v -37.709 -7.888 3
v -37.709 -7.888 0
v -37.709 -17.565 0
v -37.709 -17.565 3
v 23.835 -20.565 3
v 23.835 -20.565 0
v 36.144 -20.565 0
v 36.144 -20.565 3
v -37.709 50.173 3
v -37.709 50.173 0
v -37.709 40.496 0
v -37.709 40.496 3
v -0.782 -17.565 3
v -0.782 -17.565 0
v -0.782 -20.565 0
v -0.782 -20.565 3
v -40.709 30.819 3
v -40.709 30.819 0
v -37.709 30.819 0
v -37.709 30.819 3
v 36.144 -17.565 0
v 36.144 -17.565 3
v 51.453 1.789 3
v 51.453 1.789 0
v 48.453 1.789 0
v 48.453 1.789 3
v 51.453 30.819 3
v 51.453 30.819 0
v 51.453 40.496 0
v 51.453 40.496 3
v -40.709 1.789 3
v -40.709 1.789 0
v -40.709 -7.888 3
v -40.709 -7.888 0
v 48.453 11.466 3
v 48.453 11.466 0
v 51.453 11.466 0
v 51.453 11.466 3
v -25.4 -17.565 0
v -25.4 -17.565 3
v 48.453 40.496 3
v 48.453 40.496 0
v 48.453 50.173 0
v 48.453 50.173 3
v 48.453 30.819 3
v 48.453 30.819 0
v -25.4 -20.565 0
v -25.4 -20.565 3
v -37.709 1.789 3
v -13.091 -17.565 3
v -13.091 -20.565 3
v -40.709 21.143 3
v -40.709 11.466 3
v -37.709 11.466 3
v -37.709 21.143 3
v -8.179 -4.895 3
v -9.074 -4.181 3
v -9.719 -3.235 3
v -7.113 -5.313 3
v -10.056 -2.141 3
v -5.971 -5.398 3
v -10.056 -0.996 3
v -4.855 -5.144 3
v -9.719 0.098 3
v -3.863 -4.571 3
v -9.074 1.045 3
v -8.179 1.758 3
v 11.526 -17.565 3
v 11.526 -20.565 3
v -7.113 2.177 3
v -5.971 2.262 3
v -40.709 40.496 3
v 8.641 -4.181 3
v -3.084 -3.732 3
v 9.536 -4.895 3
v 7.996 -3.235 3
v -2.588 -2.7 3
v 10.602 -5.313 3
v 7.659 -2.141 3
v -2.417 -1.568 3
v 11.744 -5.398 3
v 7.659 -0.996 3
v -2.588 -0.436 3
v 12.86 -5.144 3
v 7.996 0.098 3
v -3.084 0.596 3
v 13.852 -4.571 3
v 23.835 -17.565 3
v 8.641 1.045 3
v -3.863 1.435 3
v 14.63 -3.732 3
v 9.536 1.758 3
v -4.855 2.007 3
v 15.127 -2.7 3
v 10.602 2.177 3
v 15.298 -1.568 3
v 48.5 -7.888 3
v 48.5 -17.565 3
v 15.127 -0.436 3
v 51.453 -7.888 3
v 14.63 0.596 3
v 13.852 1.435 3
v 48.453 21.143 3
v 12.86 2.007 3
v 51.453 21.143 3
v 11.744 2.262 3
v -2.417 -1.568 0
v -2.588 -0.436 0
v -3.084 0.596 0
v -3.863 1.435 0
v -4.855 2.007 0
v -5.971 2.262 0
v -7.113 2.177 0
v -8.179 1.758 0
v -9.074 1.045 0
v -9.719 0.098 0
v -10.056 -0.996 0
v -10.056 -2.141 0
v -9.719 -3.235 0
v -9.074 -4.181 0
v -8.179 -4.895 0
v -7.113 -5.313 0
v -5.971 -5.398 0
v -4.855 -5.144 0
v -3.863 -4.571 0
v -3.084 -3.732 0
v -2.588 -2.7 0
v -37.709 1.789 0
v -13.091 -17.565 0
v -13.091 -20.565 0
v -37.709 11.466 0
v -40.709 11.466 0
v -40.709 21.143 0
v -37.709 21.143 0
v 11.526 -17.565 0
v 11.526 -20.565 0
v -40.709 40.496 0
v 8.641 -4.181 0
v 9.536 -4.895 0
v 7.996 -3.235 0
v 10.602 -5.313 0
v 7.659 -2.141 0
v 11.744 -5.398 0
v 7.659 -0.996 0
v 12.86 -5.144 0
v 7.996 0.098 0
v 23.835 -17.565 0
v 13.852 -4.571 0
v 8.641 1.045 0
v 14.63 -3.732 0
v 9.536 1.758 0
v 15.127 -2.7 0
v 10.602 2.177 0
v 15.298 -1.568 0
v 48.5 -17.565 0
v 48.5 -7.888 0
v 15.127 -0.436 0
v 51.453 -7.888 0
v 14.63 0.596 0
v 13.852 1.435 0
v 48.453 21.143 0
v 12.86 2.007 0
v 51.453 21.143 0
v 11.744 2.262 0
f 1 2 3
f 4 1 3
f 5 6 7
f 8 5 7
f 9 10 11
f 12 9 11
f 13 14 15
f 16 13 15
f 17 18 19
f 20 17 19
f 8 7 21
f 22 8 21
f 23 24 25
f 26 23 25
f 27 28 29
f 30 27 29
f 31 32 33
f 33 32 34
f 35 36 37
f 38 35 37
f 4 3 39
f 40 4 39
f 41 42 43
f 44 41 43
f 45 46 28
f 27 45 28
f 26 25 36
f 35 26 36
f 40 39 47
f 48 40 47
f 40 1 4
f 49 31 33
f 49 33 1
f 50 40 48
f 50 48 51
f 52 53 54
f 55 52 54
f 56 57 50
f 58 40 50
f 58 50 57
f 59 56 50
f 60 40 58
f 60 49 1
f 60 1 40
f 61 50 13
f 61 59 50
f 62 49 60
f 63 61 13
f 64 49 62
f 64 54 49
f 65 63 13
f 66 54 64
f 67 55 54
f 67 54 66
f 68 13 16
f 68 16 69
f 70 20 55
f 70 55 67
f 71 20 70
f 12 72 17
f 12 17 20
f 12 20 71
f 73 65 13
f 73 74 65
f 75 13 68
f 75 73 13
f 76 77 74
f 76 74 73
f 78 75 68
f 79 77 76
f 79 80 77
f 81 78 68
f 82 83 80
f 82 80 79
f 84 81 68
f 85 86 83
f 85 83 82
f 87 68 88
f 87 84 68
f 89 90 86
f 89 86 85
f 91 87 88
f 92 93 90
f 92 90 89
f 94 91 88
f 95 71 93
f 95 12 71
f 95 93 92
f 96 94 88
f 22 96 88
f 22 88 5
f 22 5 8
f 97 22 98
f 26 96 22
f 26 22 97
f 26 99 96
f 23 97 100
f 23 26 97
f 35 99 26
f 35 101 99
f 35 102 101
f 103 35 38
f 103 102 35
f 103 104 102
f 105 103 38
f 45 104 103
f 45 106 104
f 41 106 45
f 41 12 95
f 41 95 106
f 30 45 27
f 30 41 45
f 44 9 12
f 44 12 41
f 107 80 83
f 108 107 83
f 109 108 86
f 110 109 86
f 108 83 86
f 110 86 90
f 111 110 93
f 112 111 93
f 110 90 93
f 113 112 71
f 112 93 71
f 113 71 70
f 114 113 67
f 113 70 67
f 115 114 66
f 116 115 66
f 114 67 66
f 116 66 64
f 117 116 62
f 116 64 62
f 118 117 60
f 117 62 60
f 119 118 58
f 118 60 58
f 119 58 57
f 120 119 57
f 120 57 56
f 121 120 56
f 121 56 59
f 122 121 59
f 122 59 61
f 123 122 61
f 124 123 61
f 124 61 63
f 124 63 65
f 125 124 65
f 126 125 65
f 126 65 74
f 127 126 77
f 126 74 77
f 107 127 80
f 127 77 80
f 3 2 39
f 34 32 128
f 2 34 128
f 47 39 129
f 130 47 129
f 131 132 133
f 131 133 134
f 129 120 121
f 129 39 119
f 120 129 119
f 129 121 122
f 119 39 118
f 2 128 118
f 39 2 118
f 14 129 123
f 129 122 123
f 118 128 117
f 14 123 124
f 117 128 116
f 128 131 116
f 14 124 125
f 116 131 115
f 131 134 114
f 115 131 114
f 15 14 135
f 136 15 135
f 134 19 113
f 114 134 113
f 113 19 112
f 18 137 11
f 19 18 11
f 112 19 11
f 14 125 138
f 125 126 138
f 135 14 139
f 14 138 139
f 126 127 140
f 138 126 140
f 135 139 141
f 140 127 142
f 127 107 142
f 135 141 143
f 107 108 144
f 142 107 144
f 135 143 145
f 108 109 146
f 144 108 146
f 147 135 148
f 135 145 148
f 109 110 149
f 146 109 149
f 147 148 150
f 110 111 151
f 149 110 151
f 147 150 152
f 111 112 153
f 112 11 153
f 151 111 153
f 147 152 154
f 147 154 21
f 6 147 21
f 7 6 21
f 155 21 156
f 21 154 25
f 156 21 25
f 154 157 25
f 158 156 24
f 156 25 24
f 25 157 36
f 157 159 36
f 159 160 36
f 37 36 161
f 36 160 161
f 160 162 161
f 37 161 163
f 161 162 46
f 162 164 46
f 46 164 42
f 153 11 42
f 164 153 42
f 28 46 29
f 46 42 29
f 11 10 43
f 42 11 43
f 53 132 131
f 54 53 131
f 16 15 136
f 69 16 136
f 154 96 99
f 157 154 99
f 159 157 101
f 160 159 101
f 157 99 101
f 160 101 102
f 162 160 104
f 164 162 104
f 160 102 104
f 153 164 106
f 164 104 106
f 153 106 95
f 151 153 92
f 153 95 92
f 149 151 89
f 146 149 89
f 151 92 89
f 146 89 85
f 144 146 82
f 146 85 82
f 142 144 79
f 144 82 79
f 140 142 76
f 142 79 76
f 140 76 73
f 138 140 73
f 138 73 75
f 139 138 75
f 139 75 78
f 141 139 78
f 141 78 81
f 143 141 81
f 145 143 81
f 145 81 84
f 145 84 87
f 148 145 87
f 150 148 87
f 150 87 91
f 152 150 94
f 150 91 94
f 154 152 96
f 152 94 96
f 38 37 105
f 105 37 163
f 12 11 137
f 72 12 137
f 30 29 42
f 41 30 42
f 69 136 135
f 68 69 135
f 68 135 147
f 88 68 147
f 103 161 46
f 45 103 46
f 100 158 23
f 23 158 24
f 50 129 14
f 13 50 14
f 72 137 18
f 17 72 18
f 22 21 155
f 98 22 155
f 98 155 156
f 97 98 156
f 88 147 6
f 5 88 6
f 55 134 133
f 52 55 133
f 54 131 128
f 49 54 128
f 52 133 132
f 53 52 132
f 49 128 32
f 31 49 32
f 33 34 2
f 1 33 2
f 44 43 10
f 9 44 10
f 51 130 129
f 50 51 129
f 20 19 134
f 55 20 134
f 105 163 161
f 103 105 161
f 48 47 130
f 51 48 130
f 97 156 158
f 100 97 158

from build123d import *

# Parameters (mm, degrees)
BOSS_EXTRUDE1_DEPTH = 3
SKETCH2_R           = 3.841087015
CUT_EXTRUDE1_DEPTH  = 3


with BuildPart() as part:
    # Sketch1 → Boss-Extrude1 (new body)
    with BuildSketch(Plane.XY):
        Polygon((-37.70901952, -17.564925379), (-25.400175445, -17.564925379), (-25.400175445, -20.564925379), (-13.09133137, -20.564925379), (-13.09133137, -17.564925379), (-0.782487296, -17.564925379), (-0.782487296, -20.564925379), (11.526356779, -20.564925379), (11.526356779, -17.564925379), (23.835200854, -17.564925379), (23.835200854, -20.564925379), (36.144044929, -20.564925379), (36.144044929, -17.564925379), (48.500170095, -17.564925379), (48.500170095, -7.888062048), (51.452889003, -7.888062048), (51.452889003, 1.788801284), (48.452889003, 1.788801284), (48.452889003, 11.465664615), (51.452889003, 11.465664615), (51.452889003, 21.142527947), (48.452889003, 21.142527947), (48.452889003, 30.819391278), (51.452889003, 30.819391278), (51.452889003, 40.49625461), (48.452889003, 40.49625461), (48.452889003, 50.173117941), (-37.70901952, 50.173117941), (-37.70901952, 40.49625461), (-40.70901952, 40.49625461), (-40.70901952, 30.819391278), (-37.70901952, 30.819391278), (-37.70901952, 21.142527947), (-40.70901952, 21.142527947), (-40.70901952, 11.465664615), (-37.70901952, 11.465664615), (-37.70901952, 1.788801284), (-40.70901952, 1.788801284), (-40.70901952, -7.888062048), (-37.70901952, -7.888062048), align=None)
    extrude(amount=BOSS_EXTRUDE1_DEPTH)

    # Sketch2 → Cut-Extrude1 (cut)
    with BuildSketch(Plane.XY.offset(3)):
        with Locations((-6.25812843, -1.568095487)):
            Circle(SKETCH2_R)
        with Locations((11.456834914, -1.568095487)):
            Circle(SKETCH2_R)
    extrude(amount=-CUT_EXTRUDE1_DEPTH, mode=Mode.SUBTRACT)


solid = part.part
